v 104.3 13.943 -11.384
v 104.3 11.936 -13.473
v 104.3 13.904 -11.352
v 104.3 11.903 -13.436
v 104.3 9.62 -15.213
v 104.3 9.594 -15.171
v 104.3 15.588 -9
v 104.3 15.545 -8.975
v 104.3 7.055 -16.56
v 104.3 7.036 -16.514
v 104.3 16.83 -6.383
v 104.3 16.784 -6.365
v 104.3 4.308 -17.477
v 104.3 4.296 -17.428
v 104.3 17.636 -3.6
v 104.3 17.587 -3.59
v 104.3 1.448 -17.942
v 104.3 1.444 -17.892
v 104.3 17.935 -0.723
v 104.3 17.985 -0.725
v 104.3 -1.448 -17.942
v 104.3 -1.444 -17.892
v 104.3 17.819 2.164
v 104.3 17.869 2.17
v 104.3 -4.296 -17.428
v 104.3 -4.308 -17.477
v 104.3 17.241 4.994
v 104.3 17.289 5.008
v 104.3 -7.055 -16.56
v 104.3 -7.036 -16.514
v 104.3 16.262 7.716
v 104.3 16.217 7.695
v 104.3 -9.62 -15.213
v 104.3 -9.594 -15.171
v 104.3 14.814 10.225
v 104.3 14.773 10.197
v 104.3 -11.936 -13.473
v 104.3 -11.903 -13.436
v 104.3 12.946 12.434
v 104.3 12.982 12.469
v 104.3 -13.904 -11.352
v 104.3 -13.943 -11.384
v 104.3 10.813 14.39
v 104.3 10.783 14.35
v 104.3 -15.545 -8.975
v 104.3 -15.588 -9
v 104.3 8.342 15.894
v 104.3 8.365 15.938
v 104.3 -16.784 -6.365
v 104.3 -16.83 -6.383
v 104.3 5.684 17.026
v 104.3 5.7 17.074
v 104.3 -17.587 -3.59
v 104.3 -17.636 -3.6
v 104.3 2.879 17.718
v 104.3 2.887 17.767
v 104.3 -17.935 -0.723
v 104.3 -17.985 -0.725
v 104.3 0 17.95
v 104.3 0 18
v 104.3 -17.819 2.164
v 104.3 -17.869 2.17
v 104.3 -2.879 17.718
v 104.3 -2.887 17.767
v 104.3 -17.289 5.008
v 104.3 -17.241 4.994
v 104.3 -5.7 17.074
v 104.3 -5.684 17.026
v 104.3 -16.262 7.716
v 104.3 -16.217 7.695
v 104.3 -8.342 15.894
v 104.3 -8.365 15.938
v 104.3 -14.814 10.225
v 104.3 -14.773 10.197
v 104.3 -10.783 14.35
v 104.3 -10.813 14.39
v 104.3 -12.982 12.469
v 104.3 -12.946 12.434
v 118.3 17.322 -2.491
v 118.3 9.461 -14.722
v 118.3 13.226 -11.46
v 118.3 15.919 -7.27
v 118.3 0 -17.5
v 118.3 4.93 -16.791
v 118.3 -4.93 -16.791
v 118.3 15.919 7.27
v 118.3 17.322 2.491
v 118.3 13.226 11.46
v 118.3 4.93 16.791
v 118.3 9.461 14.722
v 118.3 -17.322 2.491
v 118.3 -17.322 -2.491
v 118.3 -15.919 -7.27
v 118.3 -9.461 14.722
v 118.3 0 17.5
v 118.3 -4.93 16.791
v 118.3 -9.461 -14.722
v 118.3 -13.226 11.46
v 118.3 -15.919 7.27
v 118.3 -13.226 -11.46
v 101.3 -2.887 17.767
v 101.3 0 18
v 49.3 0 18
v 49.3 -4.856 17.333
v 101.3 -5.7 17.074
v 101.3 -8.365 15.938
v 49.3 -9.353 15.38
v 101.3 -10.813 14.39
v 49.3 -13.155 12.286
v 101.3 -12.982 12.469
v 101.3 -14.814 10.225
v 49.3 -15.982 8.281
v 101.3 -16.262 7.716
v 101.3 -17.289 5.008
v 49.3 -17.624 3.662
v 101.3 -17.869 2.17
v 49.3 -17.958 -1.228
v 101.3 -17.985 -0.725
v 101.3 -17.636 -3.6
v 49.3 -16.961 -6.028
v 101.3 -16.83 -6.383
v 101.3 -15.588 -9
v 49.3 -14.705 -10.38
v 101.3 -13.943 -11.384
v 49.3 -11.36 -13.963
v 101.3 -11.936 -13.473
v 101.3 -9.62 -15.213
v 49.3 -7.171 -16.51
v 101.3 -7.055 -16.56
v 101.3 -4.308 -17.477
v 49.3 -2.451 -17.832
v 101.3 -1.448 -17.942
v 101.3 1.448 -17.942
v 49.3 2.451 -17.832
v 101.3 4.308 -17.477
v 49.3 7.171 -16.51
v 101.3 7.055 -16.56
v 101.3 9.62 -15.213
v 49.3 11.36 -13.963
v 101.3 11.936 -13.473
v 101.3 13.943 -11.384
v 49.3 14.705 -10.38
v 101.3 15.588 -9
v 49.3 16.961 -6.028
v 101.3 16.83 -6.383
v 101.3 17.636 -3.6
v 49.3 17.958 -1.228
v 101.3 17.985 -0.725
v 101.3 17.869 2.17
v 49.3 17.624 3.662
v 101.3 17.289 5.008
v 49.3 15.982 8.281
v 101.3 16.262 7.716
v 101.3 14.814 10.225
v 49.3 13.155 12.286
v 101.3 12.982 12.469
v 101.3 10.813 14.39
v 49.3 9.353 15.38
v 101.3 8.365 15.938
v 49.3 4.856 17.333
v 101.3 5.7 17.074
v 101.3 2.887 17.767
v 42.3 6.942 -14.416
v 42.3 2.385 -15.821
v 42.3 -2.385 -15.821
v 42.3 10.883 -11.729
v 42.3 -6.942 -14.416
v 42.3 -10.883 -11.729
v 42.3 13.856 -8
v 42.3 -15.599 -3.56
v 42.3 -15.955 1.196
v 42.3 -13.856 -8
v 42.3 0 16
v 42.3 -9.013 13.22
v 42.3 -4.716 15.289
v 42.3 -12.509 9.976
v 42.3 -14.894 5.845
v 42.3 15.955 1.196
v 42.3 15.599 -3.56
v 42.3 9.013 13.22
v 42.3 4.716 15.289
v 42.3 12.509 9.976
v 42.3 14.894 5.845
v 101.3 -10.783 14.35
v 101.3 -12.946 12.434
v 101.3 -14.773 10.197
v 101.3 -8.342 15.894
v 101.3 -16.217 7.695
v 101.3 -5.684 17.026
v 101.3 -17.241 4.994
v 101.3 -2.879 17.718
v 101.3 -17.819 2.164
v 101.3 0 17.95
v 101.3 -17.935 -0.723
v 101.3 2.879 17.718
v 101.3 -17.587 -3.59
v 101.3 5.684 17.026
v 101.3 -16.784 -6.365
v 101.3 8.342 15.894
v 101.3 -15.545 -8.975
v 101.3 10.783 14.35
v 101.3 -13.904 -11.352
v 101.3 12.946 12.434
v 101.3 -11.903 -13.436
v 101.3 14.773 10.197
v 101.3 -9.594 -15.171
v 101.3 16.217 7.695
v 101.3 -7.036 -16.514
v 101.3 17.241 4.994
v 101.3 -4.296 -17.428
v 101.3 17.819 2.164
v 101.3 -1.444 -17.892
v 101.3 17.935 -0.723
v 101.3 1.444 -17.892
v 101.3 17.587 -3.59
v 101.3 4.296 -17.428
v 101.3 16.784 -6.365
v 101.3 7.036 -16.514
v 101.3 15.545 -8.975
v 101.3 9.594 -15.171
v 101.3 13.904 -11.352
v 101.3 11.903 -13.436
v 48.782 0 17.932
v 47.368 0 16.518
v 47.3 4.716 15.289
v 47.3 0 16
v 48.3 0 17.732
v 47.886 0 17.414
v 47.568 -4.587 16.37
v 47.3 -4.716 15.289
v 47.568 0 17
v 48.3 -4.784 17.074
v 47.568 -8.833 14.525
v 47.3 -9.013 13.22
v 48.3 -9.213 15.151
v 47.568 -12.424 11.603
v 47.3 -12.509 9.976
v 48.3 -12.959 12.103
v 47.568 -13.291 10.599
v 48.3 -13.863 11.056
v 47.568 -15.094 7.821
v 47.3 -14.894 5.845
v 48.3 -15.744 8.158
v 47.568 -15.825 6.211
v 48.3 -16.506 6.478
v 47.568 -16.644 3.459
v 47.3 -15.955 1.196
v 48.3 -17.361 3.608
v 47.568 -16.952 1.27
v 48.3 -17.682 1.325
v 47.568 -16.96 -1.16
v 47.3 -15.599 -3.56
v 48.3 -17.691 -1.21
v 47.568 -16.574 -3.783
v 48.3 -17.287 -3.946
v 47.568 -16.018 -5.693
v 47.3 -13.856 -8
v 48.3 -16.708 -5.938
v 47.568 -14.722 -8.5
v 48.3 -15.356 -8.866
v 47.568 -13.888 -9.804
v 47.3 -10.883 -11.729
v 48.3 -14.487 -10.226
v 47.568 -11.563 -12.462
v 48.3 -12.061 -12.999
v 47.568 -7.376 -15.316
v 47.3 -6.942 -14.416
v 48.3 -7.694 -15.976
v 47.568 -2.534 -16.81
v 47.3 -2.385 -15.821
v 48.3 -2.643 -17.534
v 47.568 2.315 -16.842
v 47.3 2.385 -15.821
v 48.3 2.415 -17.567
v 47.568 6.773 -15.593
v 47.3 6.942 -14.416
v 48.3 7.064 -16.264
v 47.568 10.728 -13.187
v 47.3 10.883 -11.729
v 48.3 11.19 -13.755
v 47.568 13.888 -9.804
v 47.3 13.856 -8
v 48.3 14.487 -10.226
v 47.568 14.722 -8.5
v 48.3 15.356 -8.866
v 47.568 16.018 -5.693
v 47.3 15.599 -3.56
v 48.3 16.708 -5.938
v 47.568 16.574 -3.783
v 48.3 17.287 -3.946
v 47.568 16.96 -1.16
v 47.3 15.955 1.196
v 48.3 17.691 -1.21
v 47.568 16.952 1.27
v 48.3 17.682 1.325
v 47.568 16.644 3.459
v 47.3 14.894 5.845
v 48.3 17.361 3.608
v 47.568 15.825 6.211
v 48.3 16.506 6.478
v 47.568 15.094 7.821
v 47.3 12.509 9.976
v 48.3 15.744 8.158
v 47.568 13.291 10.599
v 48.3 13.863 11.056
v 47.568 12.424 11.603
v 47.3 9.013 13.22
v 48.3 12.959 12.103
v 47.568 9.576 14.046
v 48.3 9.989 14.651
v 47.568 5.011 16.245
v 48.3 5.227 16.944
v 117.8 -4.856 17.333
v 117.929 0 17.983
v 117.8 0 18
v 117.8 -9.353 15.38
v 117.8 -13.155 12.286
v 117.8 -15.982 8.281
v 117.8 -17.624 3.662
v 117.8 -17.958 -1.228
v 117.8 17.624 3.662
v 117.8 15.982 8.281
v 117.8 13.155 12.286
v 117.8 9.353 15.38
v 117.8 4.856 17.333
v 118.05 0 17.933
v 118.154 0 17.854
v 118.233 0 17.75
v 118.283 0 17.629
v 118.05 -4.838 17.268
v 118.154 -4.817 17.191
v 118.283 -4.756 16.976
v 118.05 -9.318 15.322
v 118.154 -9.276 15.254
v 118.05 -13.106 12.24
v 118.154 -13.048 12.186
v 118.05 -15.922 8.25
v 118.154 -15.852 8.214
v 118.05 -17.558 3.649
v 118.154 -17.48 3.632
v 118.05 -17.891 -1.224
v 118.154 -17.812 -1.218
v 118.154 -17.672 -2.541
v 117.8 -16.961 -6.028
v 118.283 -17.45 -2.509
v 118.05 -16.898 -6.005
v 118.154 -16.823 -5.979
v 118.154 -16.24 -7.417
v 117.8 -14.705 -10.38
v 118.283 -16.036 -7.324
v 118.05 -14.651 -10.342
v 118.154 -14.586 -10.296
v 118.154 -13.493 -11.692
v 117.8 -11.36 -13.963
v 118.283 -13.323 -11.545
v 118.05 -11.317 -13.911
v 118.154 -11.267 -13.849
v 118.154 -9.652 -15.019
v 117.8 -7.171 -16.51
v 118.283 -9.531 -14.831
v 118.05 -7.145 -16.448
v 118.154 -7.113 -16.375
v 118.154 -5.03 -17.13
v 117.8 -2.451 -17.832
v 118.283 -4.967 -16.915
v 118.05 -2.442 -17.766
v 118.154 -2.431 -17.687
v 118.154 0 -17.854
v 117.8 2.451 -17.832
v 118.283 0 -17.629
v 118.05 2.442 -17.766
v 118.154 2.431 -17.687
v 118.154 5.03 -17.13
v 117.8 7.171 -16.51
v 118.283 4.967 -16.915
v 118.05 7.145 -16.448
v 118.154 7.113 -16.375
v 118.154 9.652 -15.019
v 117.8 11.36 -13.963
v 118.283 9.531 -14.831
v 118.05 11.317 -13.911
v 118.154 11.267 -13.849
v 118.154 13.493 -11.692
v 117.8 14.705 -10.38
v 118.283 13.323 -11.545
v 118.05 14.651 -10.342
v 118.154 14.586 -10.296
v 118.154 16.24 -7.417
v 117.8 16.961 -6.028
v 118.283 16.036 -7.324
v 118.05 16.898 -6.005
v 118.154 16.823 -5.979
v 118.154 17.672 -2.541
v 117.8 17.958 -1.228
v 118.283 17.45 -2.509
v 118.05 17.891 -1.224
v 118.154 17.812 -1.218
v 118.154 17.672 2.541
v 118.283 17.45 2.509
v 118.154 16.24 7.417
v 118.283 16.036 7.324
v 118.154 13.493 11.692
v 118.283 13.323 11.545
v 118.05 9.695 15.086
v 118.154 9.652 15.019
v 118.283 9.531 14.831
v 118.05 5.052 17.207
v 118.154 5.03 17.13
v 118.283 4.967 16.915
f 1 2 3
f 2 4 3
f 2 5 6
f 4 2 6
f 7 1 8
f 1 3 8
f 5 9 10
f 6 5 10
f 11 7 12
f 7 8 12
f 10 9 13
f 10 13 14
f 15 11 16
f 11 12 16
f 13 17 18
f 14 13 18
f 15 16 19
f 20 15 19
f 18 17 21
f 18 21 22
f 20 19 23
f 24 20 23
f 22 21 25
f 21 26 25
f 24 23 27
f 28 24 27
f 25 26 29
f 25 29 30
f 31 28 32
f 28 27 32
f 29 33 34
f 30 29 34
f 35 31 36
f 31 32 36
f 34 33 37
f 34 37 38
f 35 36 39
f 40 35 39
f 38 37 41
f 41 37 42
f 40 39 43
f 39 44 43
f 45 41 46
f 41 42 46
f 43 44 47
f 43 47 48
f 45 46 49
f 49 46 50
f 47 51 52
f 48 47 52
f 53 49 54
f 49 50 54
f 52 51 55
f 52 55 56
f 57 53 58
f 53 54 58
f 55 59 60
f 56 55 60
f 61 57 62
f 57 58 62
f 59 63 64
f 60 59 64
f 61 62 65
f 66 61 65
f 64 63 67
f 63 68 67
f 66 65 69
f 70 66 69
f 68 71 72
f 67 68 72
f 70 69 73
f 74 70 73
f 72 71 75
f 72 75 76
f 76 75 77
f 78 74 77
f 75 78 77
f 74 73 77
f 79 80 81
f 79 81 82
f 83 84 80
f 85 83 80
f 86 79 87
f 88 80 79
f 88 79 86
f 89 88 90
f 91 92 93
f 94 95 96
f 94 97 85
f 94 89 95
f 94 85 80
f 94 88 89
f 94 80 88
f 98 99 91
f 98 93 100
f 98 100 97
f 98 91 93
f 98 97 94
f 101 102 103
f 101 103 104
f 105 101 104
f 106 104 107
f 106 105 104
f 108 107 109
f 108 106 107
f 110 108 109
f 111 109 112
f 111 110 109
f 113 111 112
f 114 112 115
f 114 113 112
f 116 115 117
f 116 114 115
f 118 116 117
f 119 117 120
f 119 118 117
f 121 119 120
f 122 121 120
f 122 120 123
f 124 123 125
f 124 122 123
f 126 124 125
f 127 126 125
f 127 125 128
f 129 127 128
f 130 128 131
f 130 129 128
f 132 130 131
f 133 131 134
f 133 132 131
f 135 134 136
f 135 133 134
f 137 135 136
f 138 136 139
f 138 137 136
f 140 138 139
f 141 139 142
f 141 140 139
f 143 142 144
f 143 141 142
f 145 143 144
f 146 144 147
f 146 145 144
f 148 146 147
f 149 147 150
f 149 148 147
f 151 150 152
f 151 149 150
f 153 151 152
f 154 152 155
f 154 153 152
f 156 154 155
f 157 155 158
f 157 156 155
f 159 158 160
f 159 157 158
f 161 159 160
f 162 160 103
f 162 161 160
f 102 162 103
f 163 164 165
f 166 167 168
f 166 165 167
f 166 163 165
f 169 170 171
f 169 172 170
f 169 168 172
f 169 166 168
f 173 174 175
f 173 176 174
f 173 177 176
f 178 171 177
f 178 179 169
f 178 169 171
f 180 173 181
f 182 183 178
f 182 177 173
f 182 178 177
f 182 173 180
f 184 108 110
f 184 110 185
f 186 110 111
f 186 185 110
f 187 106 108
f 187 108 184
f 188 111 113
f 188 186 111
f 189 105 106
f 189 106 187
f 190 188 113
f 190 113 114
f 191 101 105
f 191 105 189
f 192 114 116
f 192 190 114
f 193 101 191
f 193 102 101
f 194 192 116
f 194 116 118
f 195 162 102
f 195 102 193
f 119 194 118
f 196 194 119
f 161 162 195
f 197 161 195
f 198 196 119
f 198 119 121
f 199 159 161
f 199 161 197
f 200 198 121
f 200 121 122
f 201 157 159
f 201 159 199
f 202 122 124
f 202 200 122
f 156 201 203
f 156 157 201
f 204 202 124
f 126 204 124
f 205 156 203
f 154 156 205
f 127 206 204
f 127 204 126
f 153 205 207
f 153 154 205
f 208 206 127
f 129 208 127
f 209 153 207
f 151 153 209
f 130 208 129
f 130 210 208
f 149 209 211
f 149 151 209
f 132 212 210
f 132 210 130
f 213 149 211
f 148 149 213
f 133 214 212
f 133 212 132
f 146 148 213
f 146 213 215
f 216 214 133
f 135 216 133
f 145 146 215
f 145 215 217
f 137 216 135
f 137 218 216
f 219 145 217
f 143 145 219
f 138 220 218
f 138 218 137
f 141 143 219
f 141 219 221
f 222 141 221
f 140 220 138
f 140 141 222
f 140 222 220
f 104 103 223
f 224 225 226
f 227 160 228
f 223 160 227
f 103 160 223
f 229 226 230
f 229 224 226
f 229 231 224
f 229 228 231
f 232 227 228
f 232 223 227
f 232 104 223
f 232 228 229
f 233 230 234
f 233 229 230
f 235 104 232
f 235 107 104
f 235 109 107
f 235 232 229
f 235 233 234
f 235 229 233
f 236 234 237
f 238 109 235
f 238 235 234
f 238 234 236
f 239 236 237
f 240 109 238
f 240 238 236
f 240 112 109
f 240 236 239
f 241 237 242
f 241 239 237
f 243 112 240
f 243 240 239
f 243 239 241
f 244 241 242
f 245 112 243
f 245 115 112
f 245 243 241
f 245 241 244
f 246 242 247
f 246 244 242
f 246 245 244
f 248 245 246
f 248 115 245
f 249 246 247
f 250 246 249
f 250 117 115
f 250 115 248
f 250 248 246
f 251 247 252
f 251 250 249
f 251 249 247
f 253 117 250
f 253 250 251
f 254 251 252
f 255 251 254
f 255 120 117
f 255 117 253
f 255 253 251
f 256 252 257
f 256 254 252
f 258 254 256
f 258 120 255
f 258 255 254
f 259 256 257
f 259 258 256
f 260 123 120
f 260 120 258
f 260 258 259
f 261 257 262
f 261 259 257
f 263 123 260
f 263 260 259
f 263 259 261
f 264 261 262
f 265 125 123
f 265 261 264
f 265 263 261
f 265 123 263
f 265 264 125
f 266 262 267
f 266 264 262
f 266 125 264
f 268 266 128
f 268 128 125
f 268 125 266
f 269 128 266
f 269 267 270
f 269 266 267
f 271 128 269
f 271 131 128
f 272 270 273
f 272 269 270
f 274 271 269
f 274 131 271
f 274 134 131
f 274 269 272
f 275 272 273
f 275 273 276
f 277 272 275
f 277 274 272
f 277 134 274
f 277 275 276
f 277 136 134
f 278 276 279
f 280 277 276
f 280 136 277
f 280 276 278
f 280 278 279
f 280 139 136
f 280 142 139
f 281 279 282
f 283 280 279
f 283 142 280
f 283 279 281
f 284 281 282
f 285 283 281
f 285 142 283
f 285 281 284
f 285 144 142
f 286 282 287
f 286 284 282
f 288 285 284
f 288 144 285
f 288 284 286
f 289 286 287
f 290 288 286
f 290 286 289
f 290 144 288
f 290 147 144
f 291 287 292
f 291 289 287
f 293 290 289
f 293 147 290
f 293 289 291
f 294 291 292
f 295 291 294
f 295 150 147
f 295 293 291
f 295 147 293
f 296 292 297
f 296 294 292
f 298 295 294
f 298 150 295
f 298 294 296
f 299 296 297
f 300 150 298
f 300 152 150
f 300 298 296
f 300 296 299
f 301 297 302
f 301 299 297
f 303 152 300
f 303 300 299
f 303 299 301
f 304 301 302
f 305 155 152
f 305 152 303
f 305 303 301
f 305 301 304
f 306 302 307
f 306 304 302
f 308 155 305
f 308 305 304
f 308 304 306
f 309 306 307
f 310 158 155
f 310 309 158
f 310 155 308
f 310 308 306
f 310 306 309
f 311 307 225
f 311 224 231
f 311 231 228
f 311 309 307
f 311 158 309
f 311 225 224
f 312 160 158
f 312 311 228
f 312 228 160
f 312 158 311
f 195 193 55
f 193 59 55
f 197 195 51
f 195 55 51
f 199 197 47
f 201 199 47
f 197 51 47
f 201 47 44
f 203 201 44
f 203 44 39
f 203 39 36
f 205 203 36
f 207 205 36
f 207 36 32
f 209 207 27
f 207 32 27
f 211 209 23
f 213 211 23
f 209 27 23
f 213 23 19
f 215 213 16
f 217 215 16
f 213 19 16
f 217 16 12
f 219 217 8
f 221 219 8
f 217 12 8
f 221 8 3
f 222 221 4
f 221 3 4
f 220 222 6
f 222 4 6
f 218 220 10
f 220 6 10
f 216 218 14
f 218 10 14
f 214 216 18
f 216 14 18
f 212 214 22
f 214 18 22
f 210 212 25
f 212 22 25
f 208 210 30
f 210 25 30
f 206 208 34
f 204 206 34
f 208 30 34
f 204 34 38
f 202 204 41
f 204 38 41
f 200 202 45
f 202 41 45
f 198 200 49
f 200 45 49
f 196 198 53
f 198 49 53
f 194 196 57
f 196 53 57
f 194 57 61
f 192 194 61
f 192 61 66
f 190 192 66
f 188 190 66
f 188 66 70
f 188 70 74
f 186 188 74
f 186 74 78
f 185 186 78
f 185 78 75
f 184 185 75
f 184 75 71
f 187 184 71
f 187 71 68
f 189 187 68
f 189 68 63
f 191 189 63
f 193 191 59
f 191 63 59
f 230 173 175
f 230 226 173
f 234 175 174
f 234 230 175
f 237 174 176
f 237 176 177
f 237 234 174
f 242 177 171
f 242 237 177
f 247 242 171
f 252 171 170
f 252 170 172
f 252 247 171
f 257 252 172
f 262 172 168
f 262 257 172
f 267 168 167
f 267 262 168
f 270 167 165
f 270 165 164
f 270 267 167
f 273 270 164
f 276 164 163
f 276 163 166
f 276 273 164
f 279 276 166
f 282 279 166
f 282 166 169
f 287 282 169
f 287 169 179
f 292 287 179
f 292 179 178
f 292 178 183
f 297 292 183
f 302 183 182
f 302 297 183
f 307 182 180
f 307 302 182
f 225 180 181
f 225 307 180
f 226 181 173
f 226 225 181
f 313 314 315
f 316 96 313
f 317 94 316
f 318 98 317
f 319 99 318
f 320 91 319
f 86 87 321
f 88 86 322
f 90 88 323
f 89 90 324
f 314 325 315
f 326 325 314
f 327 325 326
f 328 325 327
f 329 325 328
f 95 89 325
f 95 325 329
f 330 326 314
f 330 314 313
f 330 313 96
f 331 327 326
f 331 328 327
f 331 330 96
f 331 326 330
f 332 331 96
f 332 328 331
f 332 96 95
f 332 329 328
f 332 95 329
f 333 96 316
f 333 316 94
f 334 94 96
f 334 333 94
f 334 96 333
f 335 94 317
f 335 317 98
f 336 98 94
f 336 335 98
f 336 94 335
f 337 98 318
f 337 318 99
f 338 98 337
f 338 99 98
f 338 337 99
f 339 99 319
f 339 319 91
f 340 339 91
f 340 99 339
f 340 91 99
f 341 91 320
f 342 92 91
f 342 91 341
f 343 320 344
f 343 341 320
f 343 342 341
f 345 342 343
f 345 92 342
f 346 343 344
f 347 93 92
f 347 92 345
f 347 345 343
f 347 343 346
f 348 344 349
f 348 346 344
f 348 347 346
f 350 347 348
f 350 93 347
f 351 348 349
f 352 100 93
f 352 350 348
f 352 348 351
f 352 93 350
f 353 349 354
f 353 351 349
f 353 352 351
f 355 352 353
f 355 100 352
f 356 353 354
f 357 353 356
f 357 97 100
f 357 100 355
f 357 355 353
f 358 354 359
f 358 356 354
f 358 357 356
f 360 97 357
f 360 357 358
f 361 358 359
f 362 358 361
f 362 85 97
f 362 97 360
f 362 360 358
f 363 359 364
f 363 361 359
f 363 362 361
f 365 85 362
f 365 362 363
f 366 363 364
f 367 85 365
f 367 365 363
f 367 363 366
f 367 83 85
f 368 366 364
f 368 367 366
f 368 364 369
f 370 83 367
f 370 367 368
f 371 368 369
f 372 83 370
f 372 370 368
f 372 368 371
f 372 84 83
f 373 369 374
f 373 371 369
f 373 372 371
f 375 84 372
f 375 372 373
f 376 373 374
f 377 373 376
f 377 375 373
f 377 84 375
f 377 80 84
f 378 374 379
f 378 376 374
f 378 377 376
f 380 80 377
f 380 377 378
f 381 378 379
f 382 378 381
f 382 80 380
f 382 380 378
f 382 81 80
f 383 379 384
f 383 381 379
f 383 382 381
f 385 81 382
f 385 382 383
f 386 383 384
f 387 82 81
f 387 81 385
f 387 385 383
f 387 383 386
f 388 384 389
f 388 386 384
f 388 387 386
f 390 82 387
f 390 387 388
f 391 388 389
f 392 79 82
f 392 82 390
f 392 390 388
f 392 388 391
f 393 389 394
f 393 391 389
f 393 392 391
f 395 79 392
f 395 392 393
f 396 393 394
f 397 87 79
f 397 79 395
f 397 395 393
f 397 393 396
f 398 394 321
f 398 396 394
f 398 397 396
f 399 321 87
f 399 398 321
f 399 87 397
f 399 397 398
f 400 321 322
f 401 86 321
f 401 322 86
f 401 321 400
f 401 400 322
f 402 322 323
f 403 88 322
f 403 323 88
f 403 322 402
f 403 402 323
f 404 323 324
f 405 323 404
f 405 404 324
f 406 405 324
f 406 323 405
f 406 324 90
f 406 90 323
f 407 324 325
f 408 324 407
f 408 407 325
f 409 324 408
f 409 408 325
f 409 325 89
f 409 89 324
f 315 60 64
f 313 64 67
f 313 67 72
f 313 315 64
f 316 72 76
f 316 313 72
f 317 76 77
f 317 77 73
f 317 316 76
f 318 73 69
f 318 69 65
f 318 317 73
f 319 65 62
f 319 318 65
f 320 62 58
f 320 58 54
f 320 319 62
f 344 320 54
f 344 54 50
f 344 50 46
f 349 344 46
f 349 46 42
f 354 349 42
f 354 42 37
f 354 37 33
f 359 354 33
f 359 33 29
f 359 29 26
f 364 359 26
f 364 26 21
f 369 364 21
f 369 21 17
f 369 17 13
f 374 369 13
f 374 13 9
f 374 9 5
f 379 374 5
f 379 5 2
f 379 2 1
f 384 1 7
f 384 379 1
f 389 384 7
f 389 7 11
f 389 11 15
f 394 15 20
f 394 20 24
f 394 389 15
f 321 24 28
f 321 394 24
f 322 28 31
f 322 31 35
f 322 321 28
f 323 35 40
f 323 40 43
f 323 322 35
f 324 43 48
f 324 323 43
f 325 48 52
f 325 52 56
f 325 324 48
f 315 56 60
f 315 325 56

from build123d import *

# Parameters (mm, degrees)
SKETCH_1_W               = 16.3
SKETCH_1_H               = 3
SKETCH_1_W_2             = 5
SKETCH_1_H_2             = 16
SKETCH_19_W              = 3
SKETCH_19_H              = 0.05
EXTRUDE_START            = 14
SKETCH_20_R              = 18
EXTRUDE_2_DEPTH          = 14
CUT_EXTRUDE_6_DEPTH      = 3
CUT_EXTRUDE_4_DEPTH      = 12
SKETCH_13_R              = 1.5
CUT_EXTRUDE_8_DEPTH      = 7
PATTERN_CIRCULAR_2_COUNT = 4
FILLET_1_R               = 0.5
SKETCH_21_R              = 20
CUT_EXTRUDE_7_DEPTH      = 42.3


with BuildPart() as part:
    # Эскиз1 → Повернуть1 основной корпус (revolve)
    with BuildSketch(Plane(origin=(0, 0, 0), x_dir=(1, 0, 0), z_dir=(0, 1, 0)), mode=Mode.PRIVATE) as revolve_1_sk:
        with Locations((8.15, 1.5)):
            Rectangle(SKETCH_1_W, SKETCH_1_H)
        Polygon((16.3, 0), (19.3, 0), (19.3, 10), (16.3, 10), (16.3, 3), align=None)
        Polygon((24.3, 0), (24.3, 16), (20.3, 16), (19.3, 15), (19.3, 10), (19.3, 0), align=None)
        Polygon((40.8, 17.5), (42.3, 16), (42.3, 0), (24.3, 0), (24.3, 16), (25.8, 17.5), align=None)
        with Locations((44.8, 8)):
            Rectangle(SKETCH_1_W_2, SKETCH_1_H_2)
        with BuildLine():
            ThreePointArc((47.3, 16), (47.885786438, 17.414213562), (49.3, 18))
            Line((49.3, 18), (104.3, 18))
            Line((104.3, 18), (104.3, 0))
            Line((104.3, 0), (47.3, 0))
            Line((47.3, 0), (47.3, 16))
        make_face()
    revolve(revolve_1_sk.sketch.rotate(Axis((0, 0, 0), (1, 0, 0)), 180), axis=Axis((0, 0, 0), (1, 0, 0)))

    # Эскиз19 → Вырез-Повернуть2 пластиковая часть (revolve, cut)
    with BuildSketch(Plane(origin=(0, 0, 0), x_dir=(1, 0, 0), z_dir=(0, 1, 0)), mode=Mode.PRIVATE) as cut_revolve_2_sk:
        with Locations((102.8, 17.975)):
            Rectangle(SKETCH_19_W, SKETCH_19_H)
    revolve(cut_revolve_2_sk.sketch.rotate(Axis((103.004702911, 0, 0), (-1, 0, 0)), 180), axis=Axis((103.004702911, 0, 0), (-1, 0, 0)), mode=Mode.SUBTRACT)

    # Эскиз20 → Бобышка-Вытянуть2 пластиковая крышка контактов (add)
    with BuildSketch(Plane(origin=(104.3, 0, 0), x_dir=(0, 0, -1), z_dir=(1, 0, 0)).offset(EXTRUDE_START)):
        with Locations(Location((0, 0, 0), (0, 0, 180))):
            Circle(SKETCH_20_R)
    extrude(amount=-EXTRUDE_2_DEPTH)

    # Эскиз11 → Вырез-Вытянуть6 (cut)
    with BuildSketch(Plane.ZY.offset(-16.3)):
        with BuildLine():
            ThreePointArc((4.358898944, 9), (0, 10), (-4.358898944, 9))
            Line((-4.358898944, 9), (4.358898944, 9))
        make_face()
        with BuildLine():
            Line((4.358898944, -9), (-4.358898944, -9))
            ThreePointArc((-4.358898944, -9), (0, -10), (4.358898944, -9))
        make_face()
    extrude(amount=-CUT_EXTRUDE_6_DEPTH, mode=Mode.SUBTRACT)

    # Эскиз6 → Вырез-Вытянуть4 на оси (cut)
    with BuildSketch(Plane.ZY):
        with BuildLine():
            Line((-1.75306936, 2.434491286), (1.561110291, 2.561822527))
            ThreePointArc((1.561110291, 2.561822527), (-0.115175441, 2.997788288), (-1.75306936, 2.434491286))
        make_face()
    extrude(amount=-CUT_EXTRUDE_4_DEPTH, mode=Mode.SUBTRACT)

    # Эскиз13 → Вырез-Вытянуть8 для винтов (cut)
    with BuildSketch(Plane.ZY.offset(-19.3)):
        with Locations((-9.192388155, 9.192388155)):
            Circle(SKETCH_13_R)
    cut_extrude_8 = extrude(amount=-CUT_EXTRUDE_8_DEPTH, mode=Mode.SUBTRACT)

    # Круговой массив2 для винтов: Вырез-Вытянуть8 для винтов ×4 about axis
    pattern_circular_2_axis = Axis((0, 0, 0), (1, 0, 0))
    for i in range(1, PATTERN_CIRCULAR_2_COUNT):
        add(cut_extrude_8.rotate(pattern_circular_2_axis, i * 360 / PATTERN_CIRCULAR_2_COUNT), mode=Mode.SUBTRACT)

    # Скругление1
    # the kernel refuses this fillet: 0.5 mm, written as the material it takes off along each edge
    with BuildSketch(Plane(origin=(19.3, 0, 0), x_dir=(0, 0, 1), z_dir=(0, 1, 0))) as fillet_1_piece_1:
        with BuildLine():
            CenterArc((15 - FILLET_1_R * 0.414213562373, FILLET_1_R), FILLET_1_R, 270, 45)
            Line((15 - FILLET_1_R * 0.414213562373, 0), (15, 0))
            Line((15, 0), (15 + FILLET_1_R * 0.292893218813, FILLET_1_R * 0.292893218813))
        make_face()
    revolve(axis=Axis((19.3, 0, 0), (1, 0, 0)), mode=Mode.SUBTRACT)
    with BuildSketch(Plane(origin=(118.3, 0, 0), x_dir=(0, 0, 1), z_dir=(0, 1, 0))) as fillet_1_piece_2:
        with BuildLine():
            CenterArc((18 - FILLET_1_R, -FILLET_1_R), FILLET_1_R, 0, 90)
            Line((18 - FILLET_1_R, 0), (18, 0))
            Line((18, 0), (18, -FILLET_1_R))
        make_face()
    revolve(axis=Axis((118.3, 0, 0), (1, 0, 0)), mode=Mode.SUBTRACT)
    with BuildSketch(Plane(origin=(16.001803864, 9, -4.358898944), x_dir=(0, 0, 1), z_dir=(1, 0, 0))) as fillet_1_piece_3:
        with BuildLine():
            CenterArc((0.116258256, 0.5), FILLET_1_R, 243.474647983, 26.525352017)
            ThreePointArc((-0.107038622, 0.052631579), (-0.053597784, 0.026156196), (0, 0))
            Line((0, 0), (0.116258256, 0))
        make_face()
    extrude(amount=3.298196136, mode=Mode.SUBTRACT)
    with BuildSketch(Plane(origin=(16.001803864, 9, 4.358898944), x_dir=(0, -0.4412496727830022, 0.8973843804462464), z_dir=(1, 0, 0))) as fillet_1_piece_4:
        with BuildLine():
            CenterArc((0.116296493, 0.499991108), FILLET_1_R, 243.81635761, 26.525352017)
            Line((-0.104328343, 0.051298918), (0, 0))
            ThreePointArc((0, 0), (0.059639227, -0.000177843), (0.119278454, 0))
        make_face()
    extrude(amount=3.298196136, mode=Mode.SUBTRACT)
    with BuildSketch(Plane(origin=(16.3, 9, -5.608898944), x_dir=(1, 0, 0), z_dir=(0, 0, 1)), Plane(origin=(16.3, -9, 5.608898944), x_dir=(1, 0, 0), z_dir=(0, 0, -1))) as fillet_1_piece_5:
        with BuildLine():
            CenterArc((FILLET_1_R, -FILLET_1_R), FILLET_1_R, 90, 90)
            Line((0, -FILLET_1_R), (0, 0))
            Line((0, 0), (FILLET_1_R, 0))
        make_face()
    extrude(amount=11.217797887, mode=Mode.SUBTRACT)
    with BuildSketch(Plane(origin=(16.001803864, -9, 4.358898944), x_dir=(0, 0.4412496727830018, 0.8973843804462466), z_dir=(1, 0, 0))) as fillet_1_piece_6:
        with BuildLine():
            CenterArc((0.116296493, -0.499991108), FILLET_1_R, 89.658290373, 26.525352017)
            Line((-0.104328343, -0.051298918), (0, 0))
            ThreePointArc((0, 0), (0.059639227, 0.000177843), (0.119278454, 0))
        make_face()
    extrude(amount=3.298196136, mode=Mode.SUBTRACT)
    with BuildSketch(Plane(origin=(16.001803864, -9, -4.358898944), x_dir=(0, 0, 1), z_dir=(1, 0, 0))) as fillet_1_piece_7:
        with BuildLine():
            CenterArc((0.116258256, -0.5), FILLET_1_R, 90, 26.525352017)
            ThreePointArc((-0.107038622, -0.052631579), (-0.053597784, -0.026156196), (0, 0))
            Line((0, 0), (0.116258256, 0))
        make_face()
    extrude(amount=3.298196136, mode=Mode.SUBTRACT)
    with BuildSketch(Plane(origin=(19.3, 9.192388155, -9.192388155), x_dir=(0, 0, 1), z_dir=(0, -1, 0))) as fillet_1_piece_8:
        with BuildLine():
            CenterArc((1.5 + FILLET_1_R, -FILLET_1_R), FILLET_1_R, 90, 90)
            Line((1.5, -FILLET_1_R), (1.5, 0))
            Line((1.5, 0), (1.5 + FILLET_1_R, 0))
        make_face()
    revolve(axis=Axis((19.3, 9.192388155, -9.192388155), (-1, 0, 0)), mode=Mode.SUBTRACT)
    with BuildSketch(Plane(origin=(19.3, -9.192388155, -9.192388155), x_dir=(0, 1, 0), z_dir=(0, 0, 1))) as fillet_1_piece_9:
        with BuildLine():
            CenterArc((1.5 + FILLET_1_R, -FILLET_1_R), FILLET_1_R, 90, 90)
            Line((1.5, -FILLET_1_R), (1.5, 0))
            Line((1.5, 0), (1.5 + FILLET_1_R, 0))
        make_face()
    revolve(axis=Axis((19.3, -9.192388155, -9.192388155), (-1, 0, 0)), mode=Mode.SUBTRACT)
    with BuildSketch(Plane(origin=(19.3, -9.192388155, 9.192388155), x_dir=(0, 0, -1), z_dir=(0, 1, 0))) as fillet_1_piece_10:
        with BuildLine():
            CenterArc((1.5 + FILLET_1_R, -FILLET_1_R), FILLET_1_R, 90, 90)
            Line((1.5, -FILLET_1_R), (1.5, 0))
            Line((1.5, 0), (1.5 + FILLET_1_R, 0))
        make_face()
    revolve(axis=Axis((19.3, -9.192388155, 9.192388155), (-1, 0, 0)), mode=Mode.SUBTRACT)
    with BuildSketch(Plane(origin=(19.3, 9.192388155, 9.192388155), x_dir=(0, -1, 0), z_dir=(0, 0, -1))) as fillet_1_piece_11:
        with BuildLine():
            CenterArc((1.5 + FILLET_1_R, -FILLET_1_R), FILLET_1_R, 90, 90)
            Line((1.5, -FILLET_1_R), (1.5, 0))
            Line((1.5, 0), (1.5 + FILLET_1_R, 0))
        make_face()
    revolve(axis=Axis((19.3, 9.192388155, 9.192388155), (-1, 0, 0)), mode=Mode.SUBTRACT)
    # the kernel refuses this fillet: 0.5 mm, written as the material it adds along each edge
    with BuildSketch(Plane(origin=(19.3, 0, 0), x_dir=(0, -0.8947368421052432, -0.4465937565389121), z_dir=(0, -0.4465937565389121, 0.8947368421052432))) as fillet_1_2_piece_1:
        with BuildLine():
            CenterArc((10 + FILLET_1_R, -FILLET_1_R), FILLET_1_R, 90, 90)
            Line((10, -FILLET_1_R), (10, 0))
            Line((10, 0), (10 + FILLET_1_R, 0))
        make_face()
    revolve(axis=Axis((19.3, 0, 0), (1, 0, 0)), revolution_arc=126.949295967)
    with BuildSketch(Plane(origin=(19.3, 9, -4.242640687), x_dir=(0, 1, 0), z_dir=(0, 0, 1)), Plane(origin=(19.3, -9, 4.242640687), x_dir=(0, -1, 0), z_dir=(0, 0, -1))) as fillet_1_2_piece_2:
        with BuildLine():
            CenterArc((FILLET_1_R, FILLET_1_R), FILLET_1_R, 180, 90)
            Line((0, FILLET_1_R), (0, 0))
            Line((0, 0), (FILLET_1_R, 0))
        make_face()
    extrude(amount=8.485281374)
    with BuildSketch(Plane(origin=(19.3, 0, 0), x_dir=(0, 0.894736842105243, 0.44659375653891253), z_dir=(0, 0.44659375653891253, -0.894736842105243))) as fillet_1_2_piece_3:
        with BuildLine():
            CenterArc((10 + FILLET_1_R, -FILLET_1_R), FILLET_1_R, 90, 90)
            Line((10, -FILLET_1_R), (10, 0))
            Line((10, 0), (10 + FILLET_1_R, 0))
        make_face()
    revolve(axis=Axis((19.3, 0, 0), (1, 0, 0)), revolution_arc=126.949295967)
    with BuildSketch(Plane(origin=(19.3, -8.5, 4.242640687), x_dir=(0, -0.8947368421052433, 0.446593756538912), z_dir=(0, 0.446593756538912, 0.8947368421052433))) as fillet_1_2_piece_4:
        with BuildLine():
            CenterArc((0.5 + FILLET_1_R, -FILLET_1_R), FILLET_1_R, 90, 90)
            Line((0.5, -FILLET_1_R), (0.5, 0))
            Line((0.5, 0), (0.5 + FILLET_1_R, 0))
        make_face()
    revolve(axis=Axis((19.3, -8.5, 4.242640687), (1, 0, 0)), revolution_arc=26.525352017)
    with BuildSketch(Plane(origin=(19.3, -8.5, -4.242640687), x_dir=(0, -1, 0), z_dir=(0, 0, 1))) as fillet_1_2_piece_5:
        with BuildLine():
            CenterArc((0.5 + FILLET_1_R, -FILLET_1_R), FILLET_1_R, 90, 90)
            Line((0.5, -FILLET_1_R), (0.5, 0))
            Line((0.5, 0), (0.5 + FILLET_1_R, 0))
        make_face()
    revolve(axis=Axis((19.3, -8.5, -4.242640687), (1, 0, 0)), revolution_arc=26.525352017)
    with BuildSketch(Plane(origin=(19.3, 8.5, 4.242640687), x_dir=(0, 0.8947368421052433, 0.446593756538912), z_dir=(0, -0.446593756538912, 0.8947368421052433))) as fillet_1_2_piece_6:
        with BuildLine():
            CenterArc((0.5 + FILLET_1_R, FILLET_1_R), FILLET_1_R, 180, 90)
            Line((0.5, FILLET_1_R), (0.5, 0))
            Line((0.5, 0), (0.5 + FILLET_1_R, 0))
        make_face()
    revolve(axis=Axis((19.3, 8.5, 4.242640687), (-1, 0, 0)), revolution_arc=26.525352017)
    with BuildSketch(Plane(origin=(19.3, 8.5, -4.242640687), x_dir=(0, 1, 0), z_dir=(0, 0, 1))) as fillet_1_2_piece_7:
        with BuildLine():
            CenterArc((0.5 + FILLET_1_R, FILLET_1_R), FILLET_1_R, 180, 90)
            Line((0.5, FILLET_1_R), (0.5, 0))
            Line((0.5, 0), (0.5 + FILLET_1_R, 0))
        make_face()
    revolve(axis=Axis((19.3, 8.5, -4.242640687), (-1, 0, 0)), revolution_arc=26.525352017)

    # Эскиз21 → Вырез-Вытянуть7 (cut)
    with BuildSketch(Plane.ZY):
        Circle(SKETCH_21_R)
    extrude(amount=-CUT_EXTRUDE_7_DEPTH, mode=Mode.SUBTRACT)


solid = part.part
